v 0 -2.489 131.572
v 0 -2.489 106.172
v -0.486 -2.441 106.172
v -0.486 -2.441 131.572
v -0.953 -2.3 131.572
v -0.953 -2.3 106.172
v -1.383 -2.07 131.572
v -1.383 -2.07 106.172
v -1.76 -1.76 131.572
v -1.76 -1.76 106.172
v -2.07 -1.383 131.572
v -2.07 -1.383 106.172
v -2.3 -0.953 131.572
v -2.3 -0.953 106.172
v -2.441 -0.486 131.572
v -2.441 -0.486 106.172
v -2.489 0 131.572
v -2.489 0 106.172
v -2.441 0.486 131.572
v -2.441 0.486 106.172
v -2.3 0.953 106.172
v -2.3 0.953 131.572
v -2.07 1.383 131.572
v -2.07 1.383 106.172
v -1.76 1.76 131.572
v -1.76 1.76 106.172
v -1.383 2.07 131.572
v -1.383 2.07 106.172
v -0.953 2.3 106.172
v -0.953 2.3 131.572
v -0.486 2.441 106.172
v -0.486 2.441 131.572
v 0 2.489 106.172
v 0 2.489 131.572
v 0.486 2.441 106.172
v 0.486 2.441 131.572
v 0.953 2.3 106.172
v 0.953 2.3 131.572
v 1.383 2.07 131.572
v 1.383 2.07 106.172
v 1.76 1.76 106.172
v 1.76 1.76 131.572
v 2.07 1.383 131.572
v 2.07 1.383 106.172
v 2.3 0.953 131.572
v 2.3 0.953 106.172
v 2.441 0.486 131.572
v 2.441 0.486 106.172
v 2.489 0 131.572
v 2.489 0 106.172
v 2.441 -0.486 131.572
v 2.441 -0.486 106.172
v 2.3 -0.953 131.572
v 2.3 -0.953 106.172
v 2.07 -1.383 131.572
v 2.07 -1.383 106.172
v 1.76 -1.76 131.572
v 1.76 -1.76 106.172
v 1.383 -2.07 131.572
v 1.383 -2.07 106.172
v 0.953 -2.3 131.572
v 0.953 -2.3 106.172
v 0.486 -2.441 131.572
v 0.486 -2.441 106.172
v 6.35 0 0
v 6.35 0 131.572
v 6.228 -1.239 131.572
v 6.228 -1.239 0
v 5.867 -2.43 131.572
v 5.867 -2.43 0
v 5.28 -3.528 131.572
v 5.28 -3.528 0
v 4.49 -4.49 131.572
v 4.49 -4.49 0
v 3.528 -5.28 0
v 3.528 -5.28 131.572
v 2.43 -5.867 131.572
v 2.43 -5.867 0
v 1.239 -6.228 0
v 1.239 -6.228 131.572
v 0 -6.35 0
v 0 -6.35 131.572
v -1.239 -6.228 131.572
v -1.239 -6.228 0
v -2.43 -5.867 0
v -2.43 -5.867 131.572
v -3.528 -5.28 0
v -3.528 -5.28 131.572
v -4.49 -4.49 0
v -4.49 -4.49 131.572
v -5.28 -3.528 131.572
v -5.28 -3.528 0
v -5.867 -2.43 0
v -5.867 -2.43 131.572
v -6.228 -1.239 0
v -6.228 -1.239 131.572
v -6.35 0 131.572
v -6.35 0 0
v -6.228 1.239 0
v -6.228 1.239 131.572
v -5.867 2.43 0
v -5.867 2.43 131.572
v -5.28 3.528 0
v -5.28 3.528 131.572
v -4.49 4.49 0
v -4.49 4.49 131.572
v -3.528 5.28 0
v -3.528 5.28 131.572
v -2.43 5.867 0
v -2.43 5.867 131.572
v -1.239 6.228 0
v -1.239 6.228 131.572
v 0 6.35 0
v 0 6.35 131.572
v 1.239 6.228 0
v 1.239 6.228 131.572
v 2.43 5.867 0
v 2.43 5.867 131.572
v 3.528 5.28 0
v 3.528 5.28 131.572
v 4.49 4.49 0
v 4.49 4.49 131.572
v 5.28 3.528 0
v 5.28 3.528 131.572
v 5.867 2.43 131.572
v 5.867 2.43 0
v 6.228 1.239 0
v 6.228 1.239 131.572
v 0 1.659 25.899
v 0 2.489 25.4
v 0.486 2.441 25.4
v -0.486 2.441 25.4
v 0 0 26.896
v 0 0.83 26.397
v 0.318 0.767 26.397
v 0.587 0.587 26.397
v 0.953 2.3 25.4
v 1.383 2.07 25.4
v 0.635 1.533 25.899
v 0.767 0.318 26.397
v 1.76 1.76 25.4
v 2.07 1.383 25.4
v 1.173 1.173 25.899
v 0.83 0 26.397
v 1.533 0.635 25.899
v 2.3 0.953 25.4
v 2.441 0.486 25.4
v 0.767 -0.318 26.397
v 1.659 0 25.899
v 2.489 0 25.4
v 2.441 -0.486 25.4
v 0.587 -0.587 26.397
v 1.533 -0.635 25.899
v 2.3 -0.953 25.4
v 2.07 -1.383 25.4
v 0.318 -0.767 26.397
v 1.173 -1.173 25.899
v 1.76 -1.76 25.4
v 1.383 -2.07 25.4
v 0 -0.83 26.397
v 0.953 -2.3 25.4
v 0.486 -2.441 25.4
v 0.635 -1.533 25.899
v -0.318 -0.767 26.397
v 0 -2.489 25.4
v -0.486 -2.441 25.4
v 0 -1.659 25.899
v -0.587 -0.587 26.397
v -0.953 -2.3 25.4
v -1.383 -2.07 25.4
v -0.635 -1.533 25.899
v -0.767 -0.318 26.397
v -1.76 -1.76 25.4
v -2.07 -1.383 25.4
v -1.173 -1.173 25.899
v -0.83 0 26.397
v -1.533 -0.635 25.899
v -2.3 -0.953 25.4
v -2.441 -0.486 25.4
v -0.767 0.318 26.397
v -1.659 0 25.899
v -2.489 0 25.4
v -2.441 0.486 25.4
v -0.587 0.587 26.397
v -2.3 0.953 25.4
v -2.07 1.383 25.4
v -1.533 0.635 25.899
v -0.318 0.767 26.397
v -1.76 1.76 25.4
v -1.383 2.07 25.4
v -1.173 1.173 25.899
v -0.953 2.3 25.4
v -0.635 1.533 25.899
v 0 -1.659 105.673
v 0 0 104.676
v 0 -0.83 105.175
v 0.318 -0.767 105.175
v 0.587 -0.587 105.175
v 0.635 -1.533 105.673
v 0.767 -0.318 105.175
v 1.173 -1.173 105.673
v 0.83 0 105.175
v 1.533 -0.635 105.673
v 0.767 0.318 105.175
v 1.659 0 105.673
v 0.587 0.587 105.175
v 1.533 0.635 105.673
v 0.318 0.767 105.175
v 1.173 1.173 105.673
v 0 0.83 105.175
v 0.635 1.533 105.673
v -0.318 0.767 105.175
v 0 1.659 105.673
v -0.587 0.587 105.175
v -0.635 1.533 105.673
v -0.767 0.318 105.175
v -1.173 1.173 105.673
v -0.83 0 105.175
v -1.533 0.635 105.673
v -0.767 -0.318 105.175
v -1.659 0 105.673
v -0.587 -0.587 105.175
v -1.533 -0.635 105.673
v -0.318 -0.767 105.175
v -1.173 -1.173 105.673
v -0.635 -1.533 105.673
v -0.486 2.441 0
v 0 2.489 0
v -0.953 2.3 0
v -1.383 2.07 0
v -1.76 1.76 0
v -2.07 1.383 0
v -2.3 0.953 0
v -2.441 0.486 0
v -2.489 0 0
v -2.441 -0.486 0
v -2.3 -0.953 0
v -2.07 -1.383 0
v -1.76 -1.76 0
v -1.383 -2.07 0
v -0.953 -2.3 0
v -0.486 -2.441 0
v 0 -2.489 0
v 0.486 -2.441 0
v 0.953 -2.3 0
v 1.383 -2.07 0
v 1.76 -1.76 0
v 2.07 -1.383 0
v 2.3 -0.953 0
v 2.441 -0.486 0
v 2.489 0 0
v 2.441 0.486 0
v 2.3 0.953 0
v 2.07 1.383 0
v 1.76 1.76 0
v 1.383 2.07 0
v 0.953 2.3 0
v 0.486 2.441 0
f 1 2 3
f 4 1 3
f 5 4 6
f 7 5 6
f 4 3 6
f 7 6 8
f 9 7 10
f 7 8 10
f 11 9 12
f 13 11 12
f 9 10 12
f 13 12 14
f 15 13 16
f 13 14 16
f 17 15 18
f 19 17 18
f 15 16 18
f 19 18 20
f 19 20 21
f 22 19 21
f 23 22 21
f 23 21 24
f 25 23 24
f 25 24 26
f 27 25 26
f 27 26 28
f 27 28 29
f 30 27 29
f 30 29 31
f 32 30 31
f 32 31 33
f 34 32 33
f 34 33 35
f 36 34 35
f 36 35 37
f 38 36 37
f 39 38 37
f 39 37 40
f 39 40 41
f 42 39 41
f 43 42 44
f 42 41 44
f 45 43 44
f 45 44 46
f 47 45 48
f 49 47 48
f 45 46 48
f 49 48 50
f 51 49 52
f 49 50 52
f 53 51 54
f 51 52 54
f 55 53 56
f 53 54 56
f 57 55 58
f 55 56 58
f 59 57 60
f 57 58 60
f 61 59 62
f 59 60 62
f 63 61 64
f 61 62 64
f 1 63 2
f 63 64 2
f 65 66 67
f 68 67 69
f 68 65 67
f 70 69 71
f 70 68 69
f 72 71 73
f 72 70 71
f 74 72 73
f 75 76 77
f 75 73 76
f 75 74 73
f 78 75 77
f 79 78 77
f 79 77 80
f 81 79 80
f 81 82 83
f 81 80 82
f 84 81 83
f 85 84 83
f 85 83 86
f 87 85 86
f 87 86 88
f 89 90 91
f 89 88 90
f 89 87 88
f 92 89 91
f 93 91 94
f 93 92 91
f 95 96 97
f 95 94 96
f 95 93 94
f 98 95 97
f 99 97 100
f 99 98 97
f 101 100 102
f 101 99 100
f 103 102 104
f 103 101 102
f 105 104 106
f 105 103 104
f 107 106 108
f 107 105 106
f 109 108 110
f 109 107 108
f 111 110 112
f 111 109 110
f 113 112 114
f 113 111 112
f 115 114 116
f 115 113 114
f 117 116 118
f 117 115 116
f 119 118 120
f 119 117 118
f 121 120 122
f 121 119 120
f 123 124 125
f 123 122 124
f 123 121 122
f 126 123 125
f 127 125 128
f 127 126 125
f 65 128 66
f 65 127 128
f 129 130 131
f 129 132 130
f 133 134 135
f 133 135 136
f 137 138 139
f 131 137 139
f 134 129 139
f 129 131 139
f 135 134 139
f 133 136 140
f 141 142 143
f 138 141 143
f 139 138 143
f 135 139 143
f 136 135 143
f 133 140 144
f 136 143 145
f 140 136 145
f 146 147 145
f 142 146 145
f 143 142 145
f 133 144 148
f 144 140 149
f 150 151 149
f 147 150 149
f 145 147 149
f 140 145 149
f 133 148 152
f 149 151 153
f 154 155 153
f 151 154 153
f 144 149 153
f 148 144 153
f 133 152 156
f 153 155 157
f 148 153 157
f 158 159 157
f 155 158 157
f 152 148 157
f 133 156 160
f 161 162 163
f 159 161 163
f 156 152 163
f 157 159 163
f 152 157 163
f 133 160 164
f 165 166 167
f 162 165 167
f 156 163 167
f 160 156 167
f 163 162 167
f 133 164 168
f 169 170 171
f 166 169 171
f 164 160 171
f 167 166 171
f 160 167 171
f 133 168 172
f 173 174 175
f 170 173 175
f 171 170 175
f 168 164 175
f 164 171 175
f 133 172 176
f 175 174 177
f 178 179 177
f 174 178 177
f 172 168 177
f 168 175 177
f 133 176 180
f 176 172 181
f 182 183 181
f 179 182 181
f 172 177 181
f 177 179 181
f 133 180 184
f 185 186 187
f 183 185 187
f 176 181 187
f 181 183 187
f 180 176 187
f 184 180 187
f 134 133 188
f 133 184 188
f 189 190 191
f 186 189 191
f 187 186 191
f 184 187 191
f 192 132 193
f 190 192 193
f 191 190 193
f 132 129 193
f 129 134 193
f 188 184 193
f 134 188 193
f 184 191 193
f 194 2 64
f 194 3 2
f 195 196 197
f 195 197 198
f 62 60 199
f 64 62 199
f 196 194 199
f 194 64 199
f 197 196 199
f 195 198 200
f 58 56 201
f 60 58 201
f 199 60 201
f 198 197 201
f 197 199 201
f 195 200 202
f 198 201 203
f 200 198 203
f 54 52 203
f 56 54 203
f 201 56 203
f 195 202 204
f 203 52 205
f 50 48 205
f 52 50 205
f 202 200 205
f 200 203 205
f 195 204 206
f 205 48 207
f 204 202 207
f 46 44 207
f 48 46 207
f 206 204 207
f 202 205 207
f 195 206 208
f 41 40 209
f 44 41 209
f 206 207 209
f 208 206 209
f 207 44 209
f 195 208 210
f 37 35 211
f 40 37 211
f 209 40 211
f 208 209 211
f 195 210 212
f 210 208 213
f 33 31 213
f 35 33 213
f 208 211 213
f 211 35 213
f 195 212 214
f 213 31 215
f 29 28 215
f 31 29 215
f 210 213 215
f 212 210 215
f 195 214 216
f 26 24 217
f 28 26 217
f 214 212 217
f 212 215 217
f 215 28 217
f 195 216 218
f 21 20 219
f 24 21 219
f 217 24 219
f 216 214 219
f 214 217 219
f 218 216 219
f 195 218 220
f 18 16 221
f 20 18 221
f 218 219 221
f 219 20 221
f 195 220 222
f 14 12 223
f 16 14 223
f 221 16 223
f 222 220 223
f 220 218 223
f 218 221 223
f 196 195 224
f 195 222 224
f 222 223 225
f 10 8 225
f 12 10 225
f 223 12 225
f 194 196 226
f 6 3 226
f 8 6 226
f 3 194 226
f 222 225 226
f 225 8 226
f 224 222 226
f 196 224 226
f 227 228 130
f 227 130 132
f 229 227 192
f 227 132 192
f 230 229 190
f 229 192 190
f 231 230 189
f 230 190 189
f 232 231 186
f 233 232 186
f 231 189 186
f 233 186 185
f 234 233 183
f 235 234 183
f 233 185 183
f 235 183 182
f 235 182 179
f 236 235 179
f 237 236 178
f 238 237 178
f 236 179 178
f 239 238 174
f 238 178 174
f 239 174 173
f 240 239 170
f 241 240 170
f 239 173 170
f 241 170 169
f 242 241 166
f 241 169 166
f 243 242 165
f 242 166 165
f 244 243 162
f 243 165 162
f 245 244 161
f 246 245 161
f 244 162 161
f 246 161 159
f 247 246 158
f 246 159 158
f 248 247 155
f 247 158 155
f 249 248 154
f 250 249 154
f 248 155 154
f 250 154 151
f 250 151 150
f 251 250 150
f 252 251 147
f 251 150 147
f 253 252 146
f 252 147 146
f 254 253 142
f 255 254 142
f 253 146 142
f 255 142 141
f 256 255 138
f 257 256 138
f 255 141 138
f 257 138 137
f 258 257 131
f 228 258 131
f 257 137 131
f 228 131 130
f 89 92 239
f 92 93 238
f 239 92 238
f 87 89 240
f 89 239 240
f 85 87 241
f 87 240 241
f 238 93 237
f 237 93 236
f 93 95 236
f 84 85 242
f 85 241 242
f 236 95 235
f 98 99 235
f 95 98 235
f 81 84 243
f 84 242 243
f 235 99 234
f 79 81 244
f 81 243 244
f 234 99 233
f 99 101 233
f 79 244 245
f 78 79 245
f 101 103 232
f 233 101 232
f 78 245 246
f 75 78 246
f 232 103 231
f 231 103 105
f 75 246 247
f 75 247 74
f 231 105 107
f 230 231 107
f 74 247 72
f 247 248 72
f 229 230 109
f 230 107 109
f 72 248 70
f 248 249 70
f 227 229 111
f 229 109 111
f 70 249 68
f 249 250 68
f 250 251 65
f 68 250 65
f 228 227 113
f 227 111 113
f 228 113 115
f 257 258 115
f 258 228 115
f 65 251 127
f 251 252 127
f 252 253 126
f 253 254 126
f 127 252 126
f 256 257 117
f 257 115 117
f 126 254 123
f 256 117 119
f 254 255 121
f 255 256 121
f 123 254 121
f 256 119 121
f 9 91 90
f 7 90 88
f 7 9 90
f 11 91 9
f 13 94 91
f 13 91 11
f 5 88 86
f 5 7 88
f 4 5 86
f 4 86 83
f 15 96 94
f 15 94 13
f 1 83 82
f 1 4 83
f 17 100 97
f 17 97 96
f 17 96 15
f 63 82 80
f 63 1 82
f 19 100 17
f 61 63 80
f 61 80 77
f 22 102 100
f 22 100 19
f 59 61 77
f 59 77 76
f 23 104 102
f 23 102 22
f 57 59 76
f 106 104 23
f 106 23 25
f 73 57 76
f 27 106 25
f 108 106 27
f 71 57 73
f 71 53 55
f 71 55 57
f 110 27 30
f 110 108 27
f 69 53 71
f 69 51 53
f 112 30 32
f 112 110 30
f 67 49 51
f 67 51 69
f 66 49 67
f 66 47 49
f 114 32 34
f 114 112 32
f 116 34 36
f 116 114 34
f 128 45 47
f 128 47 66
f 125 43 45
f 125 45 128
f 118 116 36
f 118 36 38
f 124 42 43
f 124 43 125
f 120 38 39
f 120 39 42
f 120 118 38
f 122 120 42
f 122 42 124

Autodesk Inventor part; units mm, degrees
ref_plane "YZ Plane" through (0, 0, 0) normal (1, 0, 0) x (0, 1, 0)
ref_plane "XZ Plane" through (0, 0, 0) normal (0, 1, 0) x (-1, 0, 0)
ref_plane "XY Plane" through (0, 0, 0) normal (0, 0, 1) x (1, 0, 0)
sketch "Sketch1" plane through (0, 0, 0) normal (0, 0, 1) x (1, 0, 0)
  circle A0 centre (0, 0) radius 6.35
  dimension "d0" = 12.7
extrude "Extrusion1" add sketch "Sketch1" along normal blind 131.572
sketch "Sketch2" plane through (0, 0, 131.572) normal (0, 0, 1) x (1, 0, 0)
  circle A0 centre (0, 0) radius 6.35 projected
hole "Hole1" at (0, 0, 131.572) direction (0, 0, -1) diameter 4.9784 depth 25.4 tip angle 118 thread size "1/4-20 UNC" class "2B" standard "ANSI Unified Screw Threads"
sketch "Sketch3" plane through (0, 0, 0) normal (0, 0, -1) x (-1, 0, 0)
  circle A0 centre (0, 0) radius 6.35 projected
hole "Hole2" at (0, 0, 0) direction (0, 0, 1) diameter 4.9784 depth 25.4 tip angle 118 thread size "1/4-20 UNC" class "2B" standard "ANSI Unified Screw Threads"
properties part number "Axle Nick" material "Stainless Steel"
